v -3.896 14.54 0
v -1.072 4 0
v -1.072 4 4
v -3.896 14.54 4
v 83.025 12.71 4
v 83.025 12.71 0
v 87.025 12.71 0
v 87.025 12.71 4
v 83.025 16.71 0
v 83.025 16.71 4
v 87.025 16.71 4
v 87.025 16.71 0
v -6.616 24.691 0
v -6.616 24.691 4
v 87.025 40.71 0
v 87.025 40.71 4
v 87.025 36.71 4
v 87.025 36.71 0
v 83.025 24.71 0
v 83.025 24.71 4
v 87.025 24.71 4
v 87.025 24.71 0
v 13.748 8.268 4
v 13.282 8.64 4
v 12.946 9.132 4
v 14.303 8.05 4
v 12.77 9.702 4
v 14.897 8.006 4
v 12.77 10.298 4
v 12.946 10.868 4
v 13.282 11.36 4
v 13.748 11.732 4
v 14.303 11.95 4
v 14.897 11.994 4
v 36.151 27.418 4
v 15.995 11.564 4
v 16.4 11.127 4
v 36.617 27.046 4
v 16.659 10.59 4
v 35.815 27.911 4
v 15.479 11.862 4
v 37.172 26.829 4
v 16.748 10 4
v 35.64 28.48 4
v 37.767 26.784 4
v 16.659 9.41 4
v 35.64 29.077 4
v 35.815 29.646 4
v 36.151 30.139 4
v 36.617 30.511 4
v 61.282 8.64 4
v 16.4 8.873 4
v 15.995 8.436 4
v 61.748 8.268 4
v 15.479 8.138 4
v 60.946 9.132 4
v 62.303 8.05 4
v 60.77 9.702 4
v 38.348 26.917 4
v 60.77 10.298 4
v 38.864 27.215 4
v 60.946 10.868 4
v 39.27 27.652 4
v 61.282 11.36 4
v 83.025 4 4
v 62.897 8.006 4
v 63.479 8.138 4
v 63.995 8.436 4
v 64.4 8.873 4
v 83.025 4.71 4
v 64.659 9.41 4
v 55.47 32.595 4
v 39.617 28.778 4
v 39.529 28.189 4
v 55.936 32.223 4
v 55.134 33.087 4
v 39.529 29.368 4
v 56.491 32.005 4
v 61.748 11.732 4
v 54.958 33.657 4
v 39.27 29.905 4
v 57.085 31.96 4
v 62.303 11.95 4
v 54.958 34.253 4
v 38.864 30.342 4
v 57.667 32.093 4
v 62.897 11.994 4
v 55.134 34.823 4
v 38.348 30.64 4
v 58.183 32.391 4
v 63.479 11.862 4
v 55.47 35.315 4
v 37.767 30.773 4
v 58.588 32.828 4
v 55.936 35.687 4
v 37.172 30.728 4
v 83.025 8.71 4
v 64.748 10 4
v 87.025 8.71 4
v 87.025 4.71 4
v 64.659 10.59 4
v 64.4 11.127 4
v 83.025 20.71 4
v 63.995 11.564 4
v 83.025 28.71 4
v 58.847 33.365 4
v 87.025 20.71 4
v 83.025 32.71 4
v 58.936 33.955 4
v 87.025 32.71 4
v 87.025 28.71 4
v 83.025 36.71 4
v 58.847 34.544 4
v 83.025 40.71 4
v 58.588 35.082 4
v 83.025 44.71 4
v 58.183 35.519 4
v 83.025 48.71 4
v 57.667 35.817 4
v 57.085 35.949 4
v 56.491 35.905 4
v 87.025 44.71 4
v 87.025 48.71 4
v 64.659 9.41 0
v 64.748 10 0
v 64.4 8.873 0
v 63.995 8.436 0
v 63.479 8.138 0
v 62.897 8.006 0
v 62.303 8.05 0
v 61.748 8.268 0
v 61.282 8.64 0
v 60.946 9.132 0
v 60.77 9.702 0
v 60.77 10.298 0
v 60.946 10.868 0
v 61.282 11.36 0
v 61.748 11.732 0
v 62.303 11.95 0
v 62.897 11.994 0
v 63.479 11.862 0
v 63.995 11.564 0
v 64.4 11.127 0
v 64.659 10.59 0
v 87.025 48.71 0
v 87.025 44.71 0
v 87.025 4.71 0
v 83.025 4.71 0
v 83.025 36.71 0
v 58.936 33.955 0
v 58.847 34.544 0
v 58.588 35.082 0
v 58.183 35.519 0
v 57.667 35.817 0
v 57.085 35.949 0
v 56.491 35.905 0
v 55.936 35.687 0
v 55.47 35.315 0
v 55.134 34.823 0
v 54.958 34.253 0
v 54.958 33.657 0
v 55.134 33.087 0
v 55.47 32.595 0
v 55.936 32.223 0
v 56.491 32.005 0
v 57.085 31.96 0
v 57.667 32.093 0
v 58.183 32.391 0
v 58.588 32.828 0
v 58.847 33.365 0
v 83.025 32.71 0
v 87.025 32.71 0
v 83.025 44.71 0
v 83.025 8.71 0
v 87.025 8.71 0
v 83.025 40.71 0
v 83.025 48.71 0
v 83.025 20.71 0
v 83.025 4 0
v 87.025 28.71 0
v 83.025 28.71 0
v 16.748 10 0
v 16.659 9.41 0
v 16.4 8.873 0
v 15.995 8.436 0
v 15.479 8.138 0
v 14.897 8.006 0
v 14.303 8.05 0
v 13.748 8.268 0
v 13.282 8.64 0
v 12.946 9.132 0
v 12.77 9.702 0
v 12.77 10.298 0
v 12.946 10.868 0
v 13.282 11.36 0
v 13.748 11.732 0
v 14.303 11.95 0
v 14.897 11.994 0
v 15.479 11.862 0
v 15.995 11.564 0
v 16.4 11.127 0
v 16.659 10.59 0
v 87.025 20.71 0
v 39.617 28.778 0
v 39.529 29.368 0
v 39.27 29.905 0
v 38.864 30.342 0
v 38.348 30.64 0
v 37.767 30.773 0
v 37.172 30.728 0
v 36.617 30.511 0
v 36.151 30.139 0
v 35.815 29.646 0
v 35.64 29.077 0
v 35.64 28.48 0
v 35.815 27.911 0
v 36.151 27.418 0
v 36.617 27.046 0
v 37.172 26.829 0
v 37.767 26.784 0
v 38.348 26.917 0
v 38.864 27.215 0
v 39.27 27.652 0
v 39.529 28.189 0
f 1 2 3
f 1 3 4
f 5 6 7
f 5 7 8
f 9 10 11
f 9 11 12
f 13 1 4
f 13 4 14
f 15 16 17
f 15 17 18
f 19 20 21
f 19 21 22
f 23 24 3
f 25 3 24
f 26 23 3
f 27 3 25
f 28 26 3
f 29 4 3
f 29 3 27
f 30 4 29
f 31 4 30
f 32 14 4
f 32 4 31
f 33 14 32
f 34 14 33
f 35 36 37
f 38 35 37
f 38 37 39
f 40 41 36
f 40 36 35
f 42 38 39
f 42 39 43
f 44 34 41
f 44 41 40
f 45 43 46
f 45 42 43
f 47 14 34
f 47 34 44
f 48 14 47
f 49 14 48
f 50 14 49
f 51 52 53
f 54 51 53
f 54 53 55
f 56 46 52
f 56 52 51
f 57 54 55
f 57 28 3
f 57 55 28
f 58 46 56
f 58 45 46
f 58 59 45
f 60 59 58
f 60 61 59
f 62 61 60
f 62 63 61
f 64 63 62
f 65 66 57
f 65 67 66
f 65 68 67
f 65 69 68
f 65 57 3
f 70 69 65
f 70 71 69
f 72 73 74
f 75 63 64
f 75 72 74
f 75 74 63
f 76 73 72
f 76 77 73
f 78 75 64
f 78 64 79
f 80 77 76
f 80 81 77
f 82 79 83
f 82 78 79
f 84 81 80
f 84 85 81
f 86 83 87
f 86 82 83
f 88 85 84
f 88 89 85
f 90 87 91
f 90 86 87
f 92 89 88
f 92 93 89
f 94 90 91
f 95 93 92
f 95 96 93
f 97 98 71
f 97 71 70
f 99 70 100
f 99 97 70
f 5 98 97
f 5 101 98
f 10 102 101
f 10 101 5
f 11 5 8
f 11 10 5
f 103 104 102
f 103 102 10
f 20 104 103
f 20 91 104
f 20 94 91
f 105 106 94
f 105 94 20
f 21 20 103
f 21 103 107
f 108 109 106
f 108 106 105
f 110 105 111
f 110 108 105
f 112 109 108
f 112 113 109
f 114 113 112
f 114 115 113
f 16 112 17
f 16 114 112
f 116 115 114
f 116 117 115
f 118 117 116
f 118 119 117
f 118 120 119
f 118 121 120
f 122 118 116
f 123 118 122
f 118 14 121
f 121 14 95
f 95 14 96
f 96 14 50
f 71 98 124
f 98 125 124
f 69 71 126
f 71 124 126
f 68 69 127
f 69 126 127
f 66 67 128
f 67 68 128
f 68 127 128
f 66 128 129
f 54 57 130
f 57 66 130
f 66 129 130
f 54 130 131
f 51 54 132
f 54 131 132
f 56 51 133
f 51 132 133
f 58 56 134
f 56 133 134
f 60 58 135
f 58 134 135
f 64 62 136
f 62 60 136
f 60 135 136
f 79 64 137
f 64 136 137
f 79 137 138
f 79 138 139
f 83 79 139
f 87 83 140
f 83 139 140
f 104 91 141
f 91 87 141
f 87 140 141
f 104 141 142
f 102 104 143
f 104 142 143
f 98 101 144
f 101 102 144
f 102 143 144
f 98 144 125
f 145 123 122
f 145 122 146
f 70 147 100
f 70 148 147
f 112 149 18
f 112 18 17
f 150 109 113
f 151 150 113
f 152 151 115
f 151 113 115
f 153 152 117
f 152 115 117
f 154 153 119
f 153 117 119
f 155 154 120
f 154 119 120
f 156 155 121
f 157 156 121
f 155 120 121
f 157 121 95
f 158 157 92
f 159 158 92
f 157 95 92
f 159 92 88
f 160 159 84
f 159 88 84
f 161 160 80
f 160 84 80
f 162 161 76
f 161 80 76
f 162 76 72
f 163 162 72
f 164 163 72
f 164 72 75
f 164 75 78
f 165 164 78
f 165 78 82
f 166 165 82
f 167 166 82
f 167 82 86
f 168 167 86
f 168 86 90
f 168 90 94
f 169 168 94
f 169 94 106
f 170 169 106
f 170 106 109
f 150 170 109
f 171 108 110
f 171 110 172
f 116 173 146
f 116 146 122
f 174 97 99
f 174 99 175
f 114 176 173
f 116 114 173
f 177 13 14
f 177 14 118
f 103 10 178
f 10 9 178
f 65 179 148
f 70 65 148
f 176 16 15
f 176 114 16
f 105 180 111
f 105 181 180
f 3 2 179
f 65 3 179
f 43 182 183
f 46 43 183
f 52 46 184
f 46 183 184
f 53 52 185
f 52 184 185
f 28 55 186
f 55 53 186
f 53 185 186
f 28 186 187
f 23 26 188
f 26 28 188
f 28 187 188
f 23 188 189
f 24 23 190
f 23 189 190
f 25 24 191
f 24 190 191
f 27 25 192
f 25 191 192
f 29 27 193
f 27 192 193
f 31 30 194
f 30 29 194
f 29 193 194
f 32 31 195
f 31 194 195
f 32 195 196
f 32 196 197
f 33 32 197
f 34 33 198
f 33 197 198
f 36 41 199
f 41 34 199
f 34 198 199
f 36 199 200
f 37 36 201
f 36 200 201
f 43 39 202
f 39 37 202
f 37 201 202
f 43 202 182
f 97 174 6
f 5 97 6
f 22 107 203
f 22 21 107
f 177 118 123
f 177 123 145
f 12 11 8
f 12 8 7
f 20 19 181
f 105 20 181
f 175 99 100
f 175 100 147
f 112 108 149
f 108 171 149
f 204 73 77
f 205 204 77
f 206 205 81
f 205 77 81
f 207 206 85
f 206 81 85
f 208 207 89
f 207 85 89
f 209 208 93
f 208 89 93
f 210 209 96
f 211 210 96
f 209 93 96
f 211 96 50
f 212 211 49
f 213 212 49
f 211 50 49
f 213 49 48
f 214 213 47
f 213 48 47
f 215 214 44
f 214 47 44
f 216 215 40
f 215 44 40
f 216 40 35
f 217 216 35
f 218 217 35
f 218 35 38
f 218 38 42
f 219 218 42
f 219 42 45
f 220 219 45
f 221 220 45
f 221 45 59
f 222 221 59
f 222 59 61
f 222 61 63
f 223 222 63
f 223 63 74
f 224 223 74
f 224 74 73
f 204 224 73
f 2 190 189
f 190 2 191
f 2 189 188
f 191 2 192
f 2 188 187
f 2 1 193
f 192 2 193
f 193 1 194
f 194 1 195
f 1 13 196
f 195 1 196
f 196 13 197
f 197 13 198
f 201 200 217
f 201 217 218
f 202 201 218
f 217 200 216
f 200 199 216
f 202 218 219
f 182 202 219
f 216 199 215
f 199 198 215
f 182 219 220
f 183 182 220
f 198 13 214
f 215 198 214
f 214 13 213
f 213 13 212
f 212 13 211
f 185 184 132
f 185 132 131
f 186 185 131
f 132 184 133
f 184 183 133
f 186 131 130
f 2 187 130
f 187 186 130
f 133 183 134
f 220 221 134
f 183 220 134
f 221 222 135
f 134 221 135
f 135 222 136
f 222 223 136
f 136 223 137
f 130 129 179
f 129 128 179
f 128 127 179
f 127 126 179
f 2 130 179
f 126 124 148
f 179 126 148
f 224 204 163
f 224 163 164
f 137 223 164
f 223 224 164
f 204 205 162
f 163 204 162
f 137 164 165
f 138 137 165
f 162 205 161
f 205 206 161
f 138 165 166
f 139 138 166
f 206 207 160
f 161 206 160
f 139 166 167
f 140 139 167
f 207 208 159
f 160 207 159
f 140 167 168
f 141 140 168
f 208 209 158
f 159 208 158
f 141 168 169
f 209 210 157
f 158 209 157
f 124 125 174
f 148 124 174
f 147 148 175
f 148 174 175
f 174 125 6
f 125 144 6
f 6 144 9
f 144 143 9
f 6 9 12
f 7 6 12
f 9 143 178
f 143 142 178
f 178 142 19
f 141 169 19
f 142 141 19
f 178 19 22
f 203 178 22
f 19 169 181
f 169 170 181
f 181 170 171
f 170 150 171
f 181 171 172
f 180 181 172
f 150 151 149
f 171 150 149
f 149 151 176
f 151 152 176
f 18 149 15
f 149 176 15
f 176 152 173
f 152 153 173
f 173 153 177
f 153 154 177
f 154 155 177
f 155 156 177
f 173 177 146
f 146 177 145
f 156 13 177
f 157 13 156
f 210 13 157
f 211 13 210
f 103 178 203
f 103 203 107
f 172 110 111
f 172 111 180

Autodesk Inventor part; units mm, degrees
ref_plane "YZ Plane" through (0, 0, 0) normal (1, 0, 0) x (0, 1, 0)
ref_plane "XZ Plane" through (0, 0, 0) normal (0, 1, 0) x (-1, 0, 0)
ref_plane "XY Plane" through (0, 0, 0) normal (0, 0, 1) x (1, 0, 0)
sketch "Эскиз1" plane through (0, 0, 0) normal (0, 0, 1) x (1, 0, 0)
  line L0 (-1.0718, 4) -> (83.0251, 4)
  circle A0 centre (14.7479, 10) radius 2
  circle A1 centre (62.7479, 10) radius 2
  line L1 (-1.0718, 4) -> (-3.896, 14.54)
  line L2 (83.0251, 4) -> (83.0251, 48.71)
  line L3 (-3.896, 14.54) -> (-6.6159, 24.6909)
  line L4 (-6.6159, 24.6909) -> (83.0251, 48.71)
  dimension "d0" = 10.509
extrude "Выдавливание1" add sketch "Эскиз1" along normal blind 4
sketch "Эскиз2" plane through (83.0251, 4, 0) normal (1, 0, 0) x (0, 0, -1)
  line L0 (-4, 0) -> (-4, 44.71) projected
  line L1 (-4, 44.71) -> (0, 44.71)
  line L2 (0, 44.71) -> (0, 40.71)
  line L3 (0, 40.71) -> (-4, 40.71)
  line L4 (-4, 40.71) -> (-4, 44.71)
  point P0 (0, -4)
  point P1 (-4, 40.71)
  dimension "d3" = 4
  dimension "d4" = 4
extrude "Выдавливание2" add sketch "Эскиз2" along normal blind 4
pattern_linear "Прямоуг.массив1" count 6 spacing 8 along (0, -1, 0) of "Выдавливание2"
sketch "Эскиз3" plane through (0, 0, 4) normal (0, 0, 1) x (1, 0, 0)
  circle A0 centre (56.9359, 33.9549) radius 2
  line L0 (-6.6159, 24.6909) -> (-1.0718, 4)
  line L1 (-1.0718, 4) -> (83.0251, 4)
  line L2 (83.0251, 4) -> (83.0251, 4.71)
  line L3 (83.0251, 4.71) -> (87.0251, 4.71)
  line L4 (87.0251, 8.71) -> (87.0251, 4.71)
  line L5 (83.0251, 8.71) -> (87.0251, 8.71)
  line L6 (83.0251, 8.71) -> (83.0251, 12.71)
  line L7 (83.0251, 12.71) -> (87.0251, 12.71)
  line L8 (87.0251, 16.71) -> (87.0251, 12.71)
  line L9 (83.0251, 16.71) -> (87.0251, 16.71)
  line L10 (83.0251, 16.71) -> (83.0251, 20.71)
  line L11 (83.0251, 20.71) -> (87.0251, 20.71)
  line L12 (87.0251, 24.71) -> (87.0251, 20.71)
  line L13 (83.0251, 24.71) -> (87.0251, 24.71)
  line L14 (83.0251, 24.71) -> (83.0251, 28.71)
  line L15 (83.0251, 28.71) -> (87.0251, 28.71)
  line L16 (87.0251, 32.71) -> (87.0251, 28.71)
  line L17 (83.0251, 32.71) -> (87.0251, 32.71)
  line L18 (83.0251, 32.71) -> (83.0251, 36.71)
  line L19 (83.0251, 36.71) -> (87.0251, 36.71)
  line L20 (87.0251, 40.71) -> (87.0251, 36.71)
  line L21 (83.0251, 40.71) -> (87.0251, 40.71)
  line L22 (83.0251, 40.71) -> (83.0251, 44.71)
  line L23 (83.0251, 44.71) -> (87.0251, 44.71)
  line L24 (87.0251, 48.71) -> (87.0251, 44.71)
  line L25 (83.0251, 48.71) -> (87.0251, 48.71)
  line L26 (83.0251, 48.71) -> (-6.6159, 24.6909)
  circle A1 centre (62.7479, 10) radius 2
  circle A2 centre (14.7479, 10) radius 2
  circle A3 centre (37.6174, 28.7785) radius 2
  point P0 (0, 0)
  point P1 (0, 0)
extrude "Выдавливание3" cut sketch "Эскиз3" against normal blind 10 contours A0 | A3
properties part number "KB33-046-004-009 - Передняя левая боковая пластина"
